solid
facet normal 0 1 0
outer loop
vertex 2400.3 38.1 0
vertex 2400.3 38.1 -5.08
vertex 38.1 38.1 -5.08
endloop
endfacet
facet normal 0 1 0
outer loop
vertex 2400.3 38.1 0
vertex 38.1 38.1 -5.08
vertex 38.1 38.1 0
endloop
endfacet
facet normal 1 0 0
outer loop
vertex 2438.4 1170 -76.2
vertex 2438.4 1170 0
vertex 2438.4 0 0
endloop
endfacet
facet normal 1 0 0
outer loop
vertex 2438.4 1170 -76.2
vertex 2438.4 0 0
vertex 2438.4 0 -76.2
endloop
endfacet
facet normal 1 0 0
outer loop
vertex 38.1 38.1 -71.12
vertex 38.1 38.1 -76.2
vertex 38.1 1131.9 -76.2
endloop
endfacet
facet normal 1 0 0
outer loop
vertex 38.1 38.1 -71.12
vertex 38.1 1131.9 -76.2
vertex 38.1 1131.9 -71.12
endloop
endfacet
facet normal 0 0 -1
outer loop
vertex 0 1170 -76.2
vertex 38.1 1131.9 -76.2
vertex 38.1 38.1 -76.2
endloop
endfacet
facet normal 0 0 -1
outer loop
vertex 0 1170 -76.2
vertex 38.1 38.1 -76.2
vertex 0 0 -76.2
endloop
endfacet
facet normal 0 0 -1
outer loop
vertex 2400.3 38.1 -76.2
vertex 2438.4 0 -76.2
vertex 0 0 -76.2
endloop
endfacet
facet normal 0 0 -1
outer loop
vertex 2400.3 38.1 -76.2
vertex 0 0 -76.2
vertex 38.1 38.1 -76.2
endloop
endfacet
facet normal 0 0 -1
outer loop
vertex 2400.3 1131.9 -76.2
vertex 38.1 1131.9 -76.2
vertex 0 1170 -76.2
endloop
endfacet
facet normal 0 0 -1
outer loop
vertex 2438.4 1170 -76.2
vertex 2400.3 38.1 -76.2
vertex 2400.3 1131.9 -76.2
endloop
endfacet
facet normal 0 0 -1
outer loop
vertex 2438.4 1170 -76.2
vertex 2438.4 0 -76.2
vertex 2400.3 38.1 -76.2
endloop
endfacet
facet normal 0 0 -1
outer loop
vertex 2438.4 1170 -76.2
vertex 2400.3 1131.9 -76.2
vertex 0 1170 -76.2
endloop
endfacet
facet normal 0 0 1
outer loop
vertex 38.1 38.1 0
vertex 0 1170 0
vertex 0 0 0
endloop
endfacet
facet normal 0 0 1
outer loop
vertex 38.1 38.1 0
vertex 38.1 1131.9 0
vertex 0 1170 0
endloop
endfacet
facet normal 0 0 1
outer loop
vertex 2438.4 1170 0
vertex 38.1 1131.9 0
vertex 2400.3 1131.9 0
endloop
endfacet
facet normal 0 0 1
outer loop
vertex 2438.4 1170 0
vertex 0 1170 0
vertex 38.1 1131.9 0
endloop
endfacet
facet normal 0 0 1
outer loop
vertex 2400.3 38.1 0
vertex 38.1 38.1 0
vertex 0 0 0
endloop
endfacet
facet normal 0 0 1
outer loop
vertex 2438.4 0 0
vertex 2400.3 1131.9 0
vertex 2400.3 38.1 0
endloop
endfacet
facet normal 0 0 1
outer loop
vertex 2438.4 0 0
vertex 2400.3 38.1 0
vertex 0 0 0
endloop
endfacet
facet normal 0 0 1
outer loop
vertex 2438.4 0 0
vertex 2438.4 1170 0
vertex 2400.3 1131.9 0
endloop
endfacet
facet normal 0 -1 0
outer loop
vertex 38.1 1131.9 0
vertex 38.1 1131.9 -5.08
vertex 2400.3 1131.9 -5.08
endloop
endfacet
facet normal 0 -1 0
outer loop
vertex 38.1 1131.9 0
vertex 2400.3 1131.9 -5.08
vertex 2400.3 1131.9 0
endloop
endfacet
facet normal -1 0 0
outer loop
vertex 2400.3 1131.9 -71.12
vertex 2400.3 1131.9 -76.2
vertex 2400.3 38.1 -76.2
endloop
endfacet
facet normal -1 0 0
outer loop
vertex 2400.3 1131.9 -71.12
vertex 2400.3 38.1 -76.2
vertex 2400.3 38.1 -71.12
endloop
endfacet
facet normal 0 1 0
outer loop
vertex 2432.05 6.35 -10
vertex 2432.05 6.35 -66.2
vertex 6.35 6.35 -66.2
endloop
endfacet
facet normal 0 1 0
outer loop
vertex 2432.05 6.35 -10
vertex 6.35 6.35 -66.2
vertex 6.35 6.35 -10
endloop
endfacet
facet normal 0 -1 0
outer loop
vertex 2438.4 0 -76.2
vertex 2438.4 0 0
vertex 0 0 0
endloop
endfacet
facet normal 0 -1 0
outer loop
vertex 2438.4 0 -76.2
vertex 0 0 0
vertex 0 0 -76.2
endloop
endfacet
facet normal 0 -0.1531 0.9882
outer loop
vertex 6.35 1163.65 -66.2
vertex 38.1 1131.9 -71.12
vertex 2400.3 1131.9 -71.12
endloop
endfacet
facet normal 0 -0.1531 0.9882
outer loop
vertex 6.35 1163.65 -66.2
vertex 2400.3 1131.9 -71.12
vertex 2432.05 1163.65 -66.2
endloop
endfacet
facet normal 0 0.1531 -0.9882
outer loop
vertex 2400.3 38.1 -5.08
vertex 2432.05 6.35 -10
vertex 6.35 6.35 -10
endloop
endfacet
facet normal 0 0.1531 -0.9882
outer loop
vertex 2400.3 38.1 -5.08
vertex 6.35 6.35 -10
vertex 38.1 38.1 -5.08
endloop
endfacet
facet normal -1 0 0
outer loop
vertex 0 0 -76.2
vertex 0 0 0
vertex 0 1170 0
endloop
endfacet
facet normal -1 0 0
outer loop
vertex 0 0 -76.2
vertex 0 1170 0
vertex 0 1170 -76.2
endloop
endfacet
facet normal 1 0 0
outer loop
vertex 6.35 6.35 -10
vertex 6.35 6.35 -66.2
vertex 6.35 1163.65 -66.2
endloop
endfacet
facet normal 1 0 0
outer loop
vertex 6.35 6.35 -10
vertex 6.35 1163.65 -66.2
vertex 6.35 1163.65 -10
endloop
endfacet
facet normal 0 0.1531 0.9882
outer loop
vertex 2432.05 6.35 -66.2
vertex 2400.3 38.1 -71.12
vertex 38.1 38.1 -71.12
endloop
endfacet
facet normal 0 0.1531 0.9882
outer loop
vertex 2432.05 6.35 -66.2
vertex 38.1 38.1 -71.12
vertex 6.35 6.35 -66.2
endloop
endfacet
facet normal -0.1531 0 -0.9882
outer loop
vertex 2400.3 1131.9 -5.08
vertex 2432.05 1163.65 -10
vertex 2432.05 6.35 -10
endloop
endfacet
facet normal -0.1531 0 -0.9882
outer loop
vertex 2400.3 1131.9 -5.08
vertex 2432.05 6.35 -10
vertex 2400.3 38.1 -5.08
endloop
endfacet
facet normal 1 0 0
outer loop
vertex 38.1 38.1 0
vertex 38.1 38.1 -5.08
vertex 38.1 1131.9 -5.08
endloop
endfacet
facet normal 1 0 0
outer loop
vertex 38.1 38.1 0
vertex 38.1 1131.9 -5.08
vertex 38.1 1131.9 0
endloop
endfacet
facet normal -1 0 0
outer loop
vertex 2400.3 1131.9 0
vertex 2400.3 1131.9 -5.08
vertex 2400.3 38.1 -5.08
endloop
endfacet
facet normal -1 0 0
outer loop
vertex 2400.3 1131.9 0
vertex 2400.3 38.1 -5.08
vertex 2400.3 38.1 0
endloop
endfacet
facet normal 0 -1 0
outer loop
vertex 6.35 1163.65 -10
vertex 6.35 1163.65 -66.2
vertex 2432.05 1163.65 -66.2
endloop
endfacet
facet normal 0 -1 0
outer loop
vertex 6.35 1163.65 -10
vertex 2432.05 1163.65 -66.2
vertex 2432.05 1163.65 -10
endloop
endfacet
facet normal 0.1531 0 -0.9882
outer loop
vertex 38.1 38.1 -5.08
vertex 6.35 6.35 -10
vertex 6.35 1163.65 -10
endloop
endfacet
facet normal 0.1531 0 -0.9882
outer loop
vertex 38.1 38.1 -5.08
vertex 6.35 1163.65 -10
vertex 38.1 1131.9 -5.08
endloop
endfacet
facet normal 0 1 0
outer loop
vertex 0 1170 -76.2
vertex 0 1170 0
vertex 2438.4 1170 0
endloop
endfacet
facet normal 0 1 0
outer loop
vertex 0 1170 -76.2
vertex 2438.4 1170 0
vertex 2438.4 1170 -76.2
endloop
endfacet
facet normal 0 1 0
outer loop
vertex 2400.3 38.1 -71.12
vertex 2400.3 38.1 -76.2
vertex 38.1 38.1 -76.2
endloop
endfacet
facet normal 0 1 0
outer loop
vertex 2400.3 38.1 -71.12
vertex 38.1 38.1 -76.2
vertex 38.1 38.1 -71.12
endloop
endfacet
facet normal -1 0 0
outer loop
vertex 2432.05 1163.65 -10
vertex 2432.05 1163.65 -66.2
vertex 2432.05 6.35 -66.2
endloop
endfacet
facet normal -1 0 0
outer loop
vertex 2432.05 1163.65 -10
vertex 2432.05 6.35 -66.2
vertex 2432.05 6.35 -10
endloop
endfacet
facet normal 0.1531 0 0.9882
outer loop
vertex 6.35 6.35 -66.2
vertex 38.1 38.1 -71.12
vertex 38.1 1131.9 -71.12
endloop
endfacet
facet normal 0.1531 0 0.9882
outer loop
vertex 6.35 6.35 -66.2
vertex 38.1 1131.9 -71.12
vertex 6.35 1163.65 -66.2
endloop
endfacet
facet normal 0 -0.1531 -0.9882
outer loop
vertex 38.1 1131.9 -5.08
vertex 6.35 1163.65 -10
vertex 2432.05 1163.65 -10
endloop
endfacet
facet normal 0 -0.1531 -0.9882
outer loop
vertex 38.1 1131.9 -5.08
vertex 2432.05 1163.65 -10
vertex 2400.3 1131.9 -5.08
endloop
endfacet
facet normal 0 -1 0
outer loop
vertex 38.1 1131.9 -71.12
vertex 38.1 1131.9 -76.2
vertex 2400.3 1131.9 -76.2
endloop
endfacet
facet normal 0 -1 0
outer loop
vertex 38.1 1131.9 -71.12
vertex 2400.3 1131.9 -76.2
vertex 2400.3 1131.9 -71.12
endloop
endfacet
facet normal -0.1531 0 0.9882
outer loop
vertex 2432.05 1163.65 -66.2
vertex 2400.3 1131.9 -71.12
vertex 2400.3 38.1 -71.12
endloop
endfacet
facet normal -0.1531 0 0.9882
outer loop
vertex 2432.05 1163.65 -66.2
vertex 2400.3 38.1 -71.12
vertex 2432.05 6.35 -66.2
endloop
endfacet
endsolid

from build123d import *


with BuildPart() as f2:
    # F2: sweep along a path in F0
    with BuildLine(Plane.XY) as f2_path:
        Line((0, 0), (2438.4, 0))
        Line((2438.4, 0), (2438.4, 1170))
        Line((2438.4, 1170), (0, 1170))
        Line((0, 1170), (0, 0))
    # F1 (on Right) → F2 (sweep)
    with BuildSketch(Plane.YZ):
        Polygon((38.1, 0), (0, 0), (0, -76.2), (38.1, -76.2), (38.1, -71.12), (6.35, -66.2), (6.35, -10), (38.1, -5.08), align=None)
    sweep(path=f2_path.line, transition=Transition.RIGHT)


solid = f2.part
